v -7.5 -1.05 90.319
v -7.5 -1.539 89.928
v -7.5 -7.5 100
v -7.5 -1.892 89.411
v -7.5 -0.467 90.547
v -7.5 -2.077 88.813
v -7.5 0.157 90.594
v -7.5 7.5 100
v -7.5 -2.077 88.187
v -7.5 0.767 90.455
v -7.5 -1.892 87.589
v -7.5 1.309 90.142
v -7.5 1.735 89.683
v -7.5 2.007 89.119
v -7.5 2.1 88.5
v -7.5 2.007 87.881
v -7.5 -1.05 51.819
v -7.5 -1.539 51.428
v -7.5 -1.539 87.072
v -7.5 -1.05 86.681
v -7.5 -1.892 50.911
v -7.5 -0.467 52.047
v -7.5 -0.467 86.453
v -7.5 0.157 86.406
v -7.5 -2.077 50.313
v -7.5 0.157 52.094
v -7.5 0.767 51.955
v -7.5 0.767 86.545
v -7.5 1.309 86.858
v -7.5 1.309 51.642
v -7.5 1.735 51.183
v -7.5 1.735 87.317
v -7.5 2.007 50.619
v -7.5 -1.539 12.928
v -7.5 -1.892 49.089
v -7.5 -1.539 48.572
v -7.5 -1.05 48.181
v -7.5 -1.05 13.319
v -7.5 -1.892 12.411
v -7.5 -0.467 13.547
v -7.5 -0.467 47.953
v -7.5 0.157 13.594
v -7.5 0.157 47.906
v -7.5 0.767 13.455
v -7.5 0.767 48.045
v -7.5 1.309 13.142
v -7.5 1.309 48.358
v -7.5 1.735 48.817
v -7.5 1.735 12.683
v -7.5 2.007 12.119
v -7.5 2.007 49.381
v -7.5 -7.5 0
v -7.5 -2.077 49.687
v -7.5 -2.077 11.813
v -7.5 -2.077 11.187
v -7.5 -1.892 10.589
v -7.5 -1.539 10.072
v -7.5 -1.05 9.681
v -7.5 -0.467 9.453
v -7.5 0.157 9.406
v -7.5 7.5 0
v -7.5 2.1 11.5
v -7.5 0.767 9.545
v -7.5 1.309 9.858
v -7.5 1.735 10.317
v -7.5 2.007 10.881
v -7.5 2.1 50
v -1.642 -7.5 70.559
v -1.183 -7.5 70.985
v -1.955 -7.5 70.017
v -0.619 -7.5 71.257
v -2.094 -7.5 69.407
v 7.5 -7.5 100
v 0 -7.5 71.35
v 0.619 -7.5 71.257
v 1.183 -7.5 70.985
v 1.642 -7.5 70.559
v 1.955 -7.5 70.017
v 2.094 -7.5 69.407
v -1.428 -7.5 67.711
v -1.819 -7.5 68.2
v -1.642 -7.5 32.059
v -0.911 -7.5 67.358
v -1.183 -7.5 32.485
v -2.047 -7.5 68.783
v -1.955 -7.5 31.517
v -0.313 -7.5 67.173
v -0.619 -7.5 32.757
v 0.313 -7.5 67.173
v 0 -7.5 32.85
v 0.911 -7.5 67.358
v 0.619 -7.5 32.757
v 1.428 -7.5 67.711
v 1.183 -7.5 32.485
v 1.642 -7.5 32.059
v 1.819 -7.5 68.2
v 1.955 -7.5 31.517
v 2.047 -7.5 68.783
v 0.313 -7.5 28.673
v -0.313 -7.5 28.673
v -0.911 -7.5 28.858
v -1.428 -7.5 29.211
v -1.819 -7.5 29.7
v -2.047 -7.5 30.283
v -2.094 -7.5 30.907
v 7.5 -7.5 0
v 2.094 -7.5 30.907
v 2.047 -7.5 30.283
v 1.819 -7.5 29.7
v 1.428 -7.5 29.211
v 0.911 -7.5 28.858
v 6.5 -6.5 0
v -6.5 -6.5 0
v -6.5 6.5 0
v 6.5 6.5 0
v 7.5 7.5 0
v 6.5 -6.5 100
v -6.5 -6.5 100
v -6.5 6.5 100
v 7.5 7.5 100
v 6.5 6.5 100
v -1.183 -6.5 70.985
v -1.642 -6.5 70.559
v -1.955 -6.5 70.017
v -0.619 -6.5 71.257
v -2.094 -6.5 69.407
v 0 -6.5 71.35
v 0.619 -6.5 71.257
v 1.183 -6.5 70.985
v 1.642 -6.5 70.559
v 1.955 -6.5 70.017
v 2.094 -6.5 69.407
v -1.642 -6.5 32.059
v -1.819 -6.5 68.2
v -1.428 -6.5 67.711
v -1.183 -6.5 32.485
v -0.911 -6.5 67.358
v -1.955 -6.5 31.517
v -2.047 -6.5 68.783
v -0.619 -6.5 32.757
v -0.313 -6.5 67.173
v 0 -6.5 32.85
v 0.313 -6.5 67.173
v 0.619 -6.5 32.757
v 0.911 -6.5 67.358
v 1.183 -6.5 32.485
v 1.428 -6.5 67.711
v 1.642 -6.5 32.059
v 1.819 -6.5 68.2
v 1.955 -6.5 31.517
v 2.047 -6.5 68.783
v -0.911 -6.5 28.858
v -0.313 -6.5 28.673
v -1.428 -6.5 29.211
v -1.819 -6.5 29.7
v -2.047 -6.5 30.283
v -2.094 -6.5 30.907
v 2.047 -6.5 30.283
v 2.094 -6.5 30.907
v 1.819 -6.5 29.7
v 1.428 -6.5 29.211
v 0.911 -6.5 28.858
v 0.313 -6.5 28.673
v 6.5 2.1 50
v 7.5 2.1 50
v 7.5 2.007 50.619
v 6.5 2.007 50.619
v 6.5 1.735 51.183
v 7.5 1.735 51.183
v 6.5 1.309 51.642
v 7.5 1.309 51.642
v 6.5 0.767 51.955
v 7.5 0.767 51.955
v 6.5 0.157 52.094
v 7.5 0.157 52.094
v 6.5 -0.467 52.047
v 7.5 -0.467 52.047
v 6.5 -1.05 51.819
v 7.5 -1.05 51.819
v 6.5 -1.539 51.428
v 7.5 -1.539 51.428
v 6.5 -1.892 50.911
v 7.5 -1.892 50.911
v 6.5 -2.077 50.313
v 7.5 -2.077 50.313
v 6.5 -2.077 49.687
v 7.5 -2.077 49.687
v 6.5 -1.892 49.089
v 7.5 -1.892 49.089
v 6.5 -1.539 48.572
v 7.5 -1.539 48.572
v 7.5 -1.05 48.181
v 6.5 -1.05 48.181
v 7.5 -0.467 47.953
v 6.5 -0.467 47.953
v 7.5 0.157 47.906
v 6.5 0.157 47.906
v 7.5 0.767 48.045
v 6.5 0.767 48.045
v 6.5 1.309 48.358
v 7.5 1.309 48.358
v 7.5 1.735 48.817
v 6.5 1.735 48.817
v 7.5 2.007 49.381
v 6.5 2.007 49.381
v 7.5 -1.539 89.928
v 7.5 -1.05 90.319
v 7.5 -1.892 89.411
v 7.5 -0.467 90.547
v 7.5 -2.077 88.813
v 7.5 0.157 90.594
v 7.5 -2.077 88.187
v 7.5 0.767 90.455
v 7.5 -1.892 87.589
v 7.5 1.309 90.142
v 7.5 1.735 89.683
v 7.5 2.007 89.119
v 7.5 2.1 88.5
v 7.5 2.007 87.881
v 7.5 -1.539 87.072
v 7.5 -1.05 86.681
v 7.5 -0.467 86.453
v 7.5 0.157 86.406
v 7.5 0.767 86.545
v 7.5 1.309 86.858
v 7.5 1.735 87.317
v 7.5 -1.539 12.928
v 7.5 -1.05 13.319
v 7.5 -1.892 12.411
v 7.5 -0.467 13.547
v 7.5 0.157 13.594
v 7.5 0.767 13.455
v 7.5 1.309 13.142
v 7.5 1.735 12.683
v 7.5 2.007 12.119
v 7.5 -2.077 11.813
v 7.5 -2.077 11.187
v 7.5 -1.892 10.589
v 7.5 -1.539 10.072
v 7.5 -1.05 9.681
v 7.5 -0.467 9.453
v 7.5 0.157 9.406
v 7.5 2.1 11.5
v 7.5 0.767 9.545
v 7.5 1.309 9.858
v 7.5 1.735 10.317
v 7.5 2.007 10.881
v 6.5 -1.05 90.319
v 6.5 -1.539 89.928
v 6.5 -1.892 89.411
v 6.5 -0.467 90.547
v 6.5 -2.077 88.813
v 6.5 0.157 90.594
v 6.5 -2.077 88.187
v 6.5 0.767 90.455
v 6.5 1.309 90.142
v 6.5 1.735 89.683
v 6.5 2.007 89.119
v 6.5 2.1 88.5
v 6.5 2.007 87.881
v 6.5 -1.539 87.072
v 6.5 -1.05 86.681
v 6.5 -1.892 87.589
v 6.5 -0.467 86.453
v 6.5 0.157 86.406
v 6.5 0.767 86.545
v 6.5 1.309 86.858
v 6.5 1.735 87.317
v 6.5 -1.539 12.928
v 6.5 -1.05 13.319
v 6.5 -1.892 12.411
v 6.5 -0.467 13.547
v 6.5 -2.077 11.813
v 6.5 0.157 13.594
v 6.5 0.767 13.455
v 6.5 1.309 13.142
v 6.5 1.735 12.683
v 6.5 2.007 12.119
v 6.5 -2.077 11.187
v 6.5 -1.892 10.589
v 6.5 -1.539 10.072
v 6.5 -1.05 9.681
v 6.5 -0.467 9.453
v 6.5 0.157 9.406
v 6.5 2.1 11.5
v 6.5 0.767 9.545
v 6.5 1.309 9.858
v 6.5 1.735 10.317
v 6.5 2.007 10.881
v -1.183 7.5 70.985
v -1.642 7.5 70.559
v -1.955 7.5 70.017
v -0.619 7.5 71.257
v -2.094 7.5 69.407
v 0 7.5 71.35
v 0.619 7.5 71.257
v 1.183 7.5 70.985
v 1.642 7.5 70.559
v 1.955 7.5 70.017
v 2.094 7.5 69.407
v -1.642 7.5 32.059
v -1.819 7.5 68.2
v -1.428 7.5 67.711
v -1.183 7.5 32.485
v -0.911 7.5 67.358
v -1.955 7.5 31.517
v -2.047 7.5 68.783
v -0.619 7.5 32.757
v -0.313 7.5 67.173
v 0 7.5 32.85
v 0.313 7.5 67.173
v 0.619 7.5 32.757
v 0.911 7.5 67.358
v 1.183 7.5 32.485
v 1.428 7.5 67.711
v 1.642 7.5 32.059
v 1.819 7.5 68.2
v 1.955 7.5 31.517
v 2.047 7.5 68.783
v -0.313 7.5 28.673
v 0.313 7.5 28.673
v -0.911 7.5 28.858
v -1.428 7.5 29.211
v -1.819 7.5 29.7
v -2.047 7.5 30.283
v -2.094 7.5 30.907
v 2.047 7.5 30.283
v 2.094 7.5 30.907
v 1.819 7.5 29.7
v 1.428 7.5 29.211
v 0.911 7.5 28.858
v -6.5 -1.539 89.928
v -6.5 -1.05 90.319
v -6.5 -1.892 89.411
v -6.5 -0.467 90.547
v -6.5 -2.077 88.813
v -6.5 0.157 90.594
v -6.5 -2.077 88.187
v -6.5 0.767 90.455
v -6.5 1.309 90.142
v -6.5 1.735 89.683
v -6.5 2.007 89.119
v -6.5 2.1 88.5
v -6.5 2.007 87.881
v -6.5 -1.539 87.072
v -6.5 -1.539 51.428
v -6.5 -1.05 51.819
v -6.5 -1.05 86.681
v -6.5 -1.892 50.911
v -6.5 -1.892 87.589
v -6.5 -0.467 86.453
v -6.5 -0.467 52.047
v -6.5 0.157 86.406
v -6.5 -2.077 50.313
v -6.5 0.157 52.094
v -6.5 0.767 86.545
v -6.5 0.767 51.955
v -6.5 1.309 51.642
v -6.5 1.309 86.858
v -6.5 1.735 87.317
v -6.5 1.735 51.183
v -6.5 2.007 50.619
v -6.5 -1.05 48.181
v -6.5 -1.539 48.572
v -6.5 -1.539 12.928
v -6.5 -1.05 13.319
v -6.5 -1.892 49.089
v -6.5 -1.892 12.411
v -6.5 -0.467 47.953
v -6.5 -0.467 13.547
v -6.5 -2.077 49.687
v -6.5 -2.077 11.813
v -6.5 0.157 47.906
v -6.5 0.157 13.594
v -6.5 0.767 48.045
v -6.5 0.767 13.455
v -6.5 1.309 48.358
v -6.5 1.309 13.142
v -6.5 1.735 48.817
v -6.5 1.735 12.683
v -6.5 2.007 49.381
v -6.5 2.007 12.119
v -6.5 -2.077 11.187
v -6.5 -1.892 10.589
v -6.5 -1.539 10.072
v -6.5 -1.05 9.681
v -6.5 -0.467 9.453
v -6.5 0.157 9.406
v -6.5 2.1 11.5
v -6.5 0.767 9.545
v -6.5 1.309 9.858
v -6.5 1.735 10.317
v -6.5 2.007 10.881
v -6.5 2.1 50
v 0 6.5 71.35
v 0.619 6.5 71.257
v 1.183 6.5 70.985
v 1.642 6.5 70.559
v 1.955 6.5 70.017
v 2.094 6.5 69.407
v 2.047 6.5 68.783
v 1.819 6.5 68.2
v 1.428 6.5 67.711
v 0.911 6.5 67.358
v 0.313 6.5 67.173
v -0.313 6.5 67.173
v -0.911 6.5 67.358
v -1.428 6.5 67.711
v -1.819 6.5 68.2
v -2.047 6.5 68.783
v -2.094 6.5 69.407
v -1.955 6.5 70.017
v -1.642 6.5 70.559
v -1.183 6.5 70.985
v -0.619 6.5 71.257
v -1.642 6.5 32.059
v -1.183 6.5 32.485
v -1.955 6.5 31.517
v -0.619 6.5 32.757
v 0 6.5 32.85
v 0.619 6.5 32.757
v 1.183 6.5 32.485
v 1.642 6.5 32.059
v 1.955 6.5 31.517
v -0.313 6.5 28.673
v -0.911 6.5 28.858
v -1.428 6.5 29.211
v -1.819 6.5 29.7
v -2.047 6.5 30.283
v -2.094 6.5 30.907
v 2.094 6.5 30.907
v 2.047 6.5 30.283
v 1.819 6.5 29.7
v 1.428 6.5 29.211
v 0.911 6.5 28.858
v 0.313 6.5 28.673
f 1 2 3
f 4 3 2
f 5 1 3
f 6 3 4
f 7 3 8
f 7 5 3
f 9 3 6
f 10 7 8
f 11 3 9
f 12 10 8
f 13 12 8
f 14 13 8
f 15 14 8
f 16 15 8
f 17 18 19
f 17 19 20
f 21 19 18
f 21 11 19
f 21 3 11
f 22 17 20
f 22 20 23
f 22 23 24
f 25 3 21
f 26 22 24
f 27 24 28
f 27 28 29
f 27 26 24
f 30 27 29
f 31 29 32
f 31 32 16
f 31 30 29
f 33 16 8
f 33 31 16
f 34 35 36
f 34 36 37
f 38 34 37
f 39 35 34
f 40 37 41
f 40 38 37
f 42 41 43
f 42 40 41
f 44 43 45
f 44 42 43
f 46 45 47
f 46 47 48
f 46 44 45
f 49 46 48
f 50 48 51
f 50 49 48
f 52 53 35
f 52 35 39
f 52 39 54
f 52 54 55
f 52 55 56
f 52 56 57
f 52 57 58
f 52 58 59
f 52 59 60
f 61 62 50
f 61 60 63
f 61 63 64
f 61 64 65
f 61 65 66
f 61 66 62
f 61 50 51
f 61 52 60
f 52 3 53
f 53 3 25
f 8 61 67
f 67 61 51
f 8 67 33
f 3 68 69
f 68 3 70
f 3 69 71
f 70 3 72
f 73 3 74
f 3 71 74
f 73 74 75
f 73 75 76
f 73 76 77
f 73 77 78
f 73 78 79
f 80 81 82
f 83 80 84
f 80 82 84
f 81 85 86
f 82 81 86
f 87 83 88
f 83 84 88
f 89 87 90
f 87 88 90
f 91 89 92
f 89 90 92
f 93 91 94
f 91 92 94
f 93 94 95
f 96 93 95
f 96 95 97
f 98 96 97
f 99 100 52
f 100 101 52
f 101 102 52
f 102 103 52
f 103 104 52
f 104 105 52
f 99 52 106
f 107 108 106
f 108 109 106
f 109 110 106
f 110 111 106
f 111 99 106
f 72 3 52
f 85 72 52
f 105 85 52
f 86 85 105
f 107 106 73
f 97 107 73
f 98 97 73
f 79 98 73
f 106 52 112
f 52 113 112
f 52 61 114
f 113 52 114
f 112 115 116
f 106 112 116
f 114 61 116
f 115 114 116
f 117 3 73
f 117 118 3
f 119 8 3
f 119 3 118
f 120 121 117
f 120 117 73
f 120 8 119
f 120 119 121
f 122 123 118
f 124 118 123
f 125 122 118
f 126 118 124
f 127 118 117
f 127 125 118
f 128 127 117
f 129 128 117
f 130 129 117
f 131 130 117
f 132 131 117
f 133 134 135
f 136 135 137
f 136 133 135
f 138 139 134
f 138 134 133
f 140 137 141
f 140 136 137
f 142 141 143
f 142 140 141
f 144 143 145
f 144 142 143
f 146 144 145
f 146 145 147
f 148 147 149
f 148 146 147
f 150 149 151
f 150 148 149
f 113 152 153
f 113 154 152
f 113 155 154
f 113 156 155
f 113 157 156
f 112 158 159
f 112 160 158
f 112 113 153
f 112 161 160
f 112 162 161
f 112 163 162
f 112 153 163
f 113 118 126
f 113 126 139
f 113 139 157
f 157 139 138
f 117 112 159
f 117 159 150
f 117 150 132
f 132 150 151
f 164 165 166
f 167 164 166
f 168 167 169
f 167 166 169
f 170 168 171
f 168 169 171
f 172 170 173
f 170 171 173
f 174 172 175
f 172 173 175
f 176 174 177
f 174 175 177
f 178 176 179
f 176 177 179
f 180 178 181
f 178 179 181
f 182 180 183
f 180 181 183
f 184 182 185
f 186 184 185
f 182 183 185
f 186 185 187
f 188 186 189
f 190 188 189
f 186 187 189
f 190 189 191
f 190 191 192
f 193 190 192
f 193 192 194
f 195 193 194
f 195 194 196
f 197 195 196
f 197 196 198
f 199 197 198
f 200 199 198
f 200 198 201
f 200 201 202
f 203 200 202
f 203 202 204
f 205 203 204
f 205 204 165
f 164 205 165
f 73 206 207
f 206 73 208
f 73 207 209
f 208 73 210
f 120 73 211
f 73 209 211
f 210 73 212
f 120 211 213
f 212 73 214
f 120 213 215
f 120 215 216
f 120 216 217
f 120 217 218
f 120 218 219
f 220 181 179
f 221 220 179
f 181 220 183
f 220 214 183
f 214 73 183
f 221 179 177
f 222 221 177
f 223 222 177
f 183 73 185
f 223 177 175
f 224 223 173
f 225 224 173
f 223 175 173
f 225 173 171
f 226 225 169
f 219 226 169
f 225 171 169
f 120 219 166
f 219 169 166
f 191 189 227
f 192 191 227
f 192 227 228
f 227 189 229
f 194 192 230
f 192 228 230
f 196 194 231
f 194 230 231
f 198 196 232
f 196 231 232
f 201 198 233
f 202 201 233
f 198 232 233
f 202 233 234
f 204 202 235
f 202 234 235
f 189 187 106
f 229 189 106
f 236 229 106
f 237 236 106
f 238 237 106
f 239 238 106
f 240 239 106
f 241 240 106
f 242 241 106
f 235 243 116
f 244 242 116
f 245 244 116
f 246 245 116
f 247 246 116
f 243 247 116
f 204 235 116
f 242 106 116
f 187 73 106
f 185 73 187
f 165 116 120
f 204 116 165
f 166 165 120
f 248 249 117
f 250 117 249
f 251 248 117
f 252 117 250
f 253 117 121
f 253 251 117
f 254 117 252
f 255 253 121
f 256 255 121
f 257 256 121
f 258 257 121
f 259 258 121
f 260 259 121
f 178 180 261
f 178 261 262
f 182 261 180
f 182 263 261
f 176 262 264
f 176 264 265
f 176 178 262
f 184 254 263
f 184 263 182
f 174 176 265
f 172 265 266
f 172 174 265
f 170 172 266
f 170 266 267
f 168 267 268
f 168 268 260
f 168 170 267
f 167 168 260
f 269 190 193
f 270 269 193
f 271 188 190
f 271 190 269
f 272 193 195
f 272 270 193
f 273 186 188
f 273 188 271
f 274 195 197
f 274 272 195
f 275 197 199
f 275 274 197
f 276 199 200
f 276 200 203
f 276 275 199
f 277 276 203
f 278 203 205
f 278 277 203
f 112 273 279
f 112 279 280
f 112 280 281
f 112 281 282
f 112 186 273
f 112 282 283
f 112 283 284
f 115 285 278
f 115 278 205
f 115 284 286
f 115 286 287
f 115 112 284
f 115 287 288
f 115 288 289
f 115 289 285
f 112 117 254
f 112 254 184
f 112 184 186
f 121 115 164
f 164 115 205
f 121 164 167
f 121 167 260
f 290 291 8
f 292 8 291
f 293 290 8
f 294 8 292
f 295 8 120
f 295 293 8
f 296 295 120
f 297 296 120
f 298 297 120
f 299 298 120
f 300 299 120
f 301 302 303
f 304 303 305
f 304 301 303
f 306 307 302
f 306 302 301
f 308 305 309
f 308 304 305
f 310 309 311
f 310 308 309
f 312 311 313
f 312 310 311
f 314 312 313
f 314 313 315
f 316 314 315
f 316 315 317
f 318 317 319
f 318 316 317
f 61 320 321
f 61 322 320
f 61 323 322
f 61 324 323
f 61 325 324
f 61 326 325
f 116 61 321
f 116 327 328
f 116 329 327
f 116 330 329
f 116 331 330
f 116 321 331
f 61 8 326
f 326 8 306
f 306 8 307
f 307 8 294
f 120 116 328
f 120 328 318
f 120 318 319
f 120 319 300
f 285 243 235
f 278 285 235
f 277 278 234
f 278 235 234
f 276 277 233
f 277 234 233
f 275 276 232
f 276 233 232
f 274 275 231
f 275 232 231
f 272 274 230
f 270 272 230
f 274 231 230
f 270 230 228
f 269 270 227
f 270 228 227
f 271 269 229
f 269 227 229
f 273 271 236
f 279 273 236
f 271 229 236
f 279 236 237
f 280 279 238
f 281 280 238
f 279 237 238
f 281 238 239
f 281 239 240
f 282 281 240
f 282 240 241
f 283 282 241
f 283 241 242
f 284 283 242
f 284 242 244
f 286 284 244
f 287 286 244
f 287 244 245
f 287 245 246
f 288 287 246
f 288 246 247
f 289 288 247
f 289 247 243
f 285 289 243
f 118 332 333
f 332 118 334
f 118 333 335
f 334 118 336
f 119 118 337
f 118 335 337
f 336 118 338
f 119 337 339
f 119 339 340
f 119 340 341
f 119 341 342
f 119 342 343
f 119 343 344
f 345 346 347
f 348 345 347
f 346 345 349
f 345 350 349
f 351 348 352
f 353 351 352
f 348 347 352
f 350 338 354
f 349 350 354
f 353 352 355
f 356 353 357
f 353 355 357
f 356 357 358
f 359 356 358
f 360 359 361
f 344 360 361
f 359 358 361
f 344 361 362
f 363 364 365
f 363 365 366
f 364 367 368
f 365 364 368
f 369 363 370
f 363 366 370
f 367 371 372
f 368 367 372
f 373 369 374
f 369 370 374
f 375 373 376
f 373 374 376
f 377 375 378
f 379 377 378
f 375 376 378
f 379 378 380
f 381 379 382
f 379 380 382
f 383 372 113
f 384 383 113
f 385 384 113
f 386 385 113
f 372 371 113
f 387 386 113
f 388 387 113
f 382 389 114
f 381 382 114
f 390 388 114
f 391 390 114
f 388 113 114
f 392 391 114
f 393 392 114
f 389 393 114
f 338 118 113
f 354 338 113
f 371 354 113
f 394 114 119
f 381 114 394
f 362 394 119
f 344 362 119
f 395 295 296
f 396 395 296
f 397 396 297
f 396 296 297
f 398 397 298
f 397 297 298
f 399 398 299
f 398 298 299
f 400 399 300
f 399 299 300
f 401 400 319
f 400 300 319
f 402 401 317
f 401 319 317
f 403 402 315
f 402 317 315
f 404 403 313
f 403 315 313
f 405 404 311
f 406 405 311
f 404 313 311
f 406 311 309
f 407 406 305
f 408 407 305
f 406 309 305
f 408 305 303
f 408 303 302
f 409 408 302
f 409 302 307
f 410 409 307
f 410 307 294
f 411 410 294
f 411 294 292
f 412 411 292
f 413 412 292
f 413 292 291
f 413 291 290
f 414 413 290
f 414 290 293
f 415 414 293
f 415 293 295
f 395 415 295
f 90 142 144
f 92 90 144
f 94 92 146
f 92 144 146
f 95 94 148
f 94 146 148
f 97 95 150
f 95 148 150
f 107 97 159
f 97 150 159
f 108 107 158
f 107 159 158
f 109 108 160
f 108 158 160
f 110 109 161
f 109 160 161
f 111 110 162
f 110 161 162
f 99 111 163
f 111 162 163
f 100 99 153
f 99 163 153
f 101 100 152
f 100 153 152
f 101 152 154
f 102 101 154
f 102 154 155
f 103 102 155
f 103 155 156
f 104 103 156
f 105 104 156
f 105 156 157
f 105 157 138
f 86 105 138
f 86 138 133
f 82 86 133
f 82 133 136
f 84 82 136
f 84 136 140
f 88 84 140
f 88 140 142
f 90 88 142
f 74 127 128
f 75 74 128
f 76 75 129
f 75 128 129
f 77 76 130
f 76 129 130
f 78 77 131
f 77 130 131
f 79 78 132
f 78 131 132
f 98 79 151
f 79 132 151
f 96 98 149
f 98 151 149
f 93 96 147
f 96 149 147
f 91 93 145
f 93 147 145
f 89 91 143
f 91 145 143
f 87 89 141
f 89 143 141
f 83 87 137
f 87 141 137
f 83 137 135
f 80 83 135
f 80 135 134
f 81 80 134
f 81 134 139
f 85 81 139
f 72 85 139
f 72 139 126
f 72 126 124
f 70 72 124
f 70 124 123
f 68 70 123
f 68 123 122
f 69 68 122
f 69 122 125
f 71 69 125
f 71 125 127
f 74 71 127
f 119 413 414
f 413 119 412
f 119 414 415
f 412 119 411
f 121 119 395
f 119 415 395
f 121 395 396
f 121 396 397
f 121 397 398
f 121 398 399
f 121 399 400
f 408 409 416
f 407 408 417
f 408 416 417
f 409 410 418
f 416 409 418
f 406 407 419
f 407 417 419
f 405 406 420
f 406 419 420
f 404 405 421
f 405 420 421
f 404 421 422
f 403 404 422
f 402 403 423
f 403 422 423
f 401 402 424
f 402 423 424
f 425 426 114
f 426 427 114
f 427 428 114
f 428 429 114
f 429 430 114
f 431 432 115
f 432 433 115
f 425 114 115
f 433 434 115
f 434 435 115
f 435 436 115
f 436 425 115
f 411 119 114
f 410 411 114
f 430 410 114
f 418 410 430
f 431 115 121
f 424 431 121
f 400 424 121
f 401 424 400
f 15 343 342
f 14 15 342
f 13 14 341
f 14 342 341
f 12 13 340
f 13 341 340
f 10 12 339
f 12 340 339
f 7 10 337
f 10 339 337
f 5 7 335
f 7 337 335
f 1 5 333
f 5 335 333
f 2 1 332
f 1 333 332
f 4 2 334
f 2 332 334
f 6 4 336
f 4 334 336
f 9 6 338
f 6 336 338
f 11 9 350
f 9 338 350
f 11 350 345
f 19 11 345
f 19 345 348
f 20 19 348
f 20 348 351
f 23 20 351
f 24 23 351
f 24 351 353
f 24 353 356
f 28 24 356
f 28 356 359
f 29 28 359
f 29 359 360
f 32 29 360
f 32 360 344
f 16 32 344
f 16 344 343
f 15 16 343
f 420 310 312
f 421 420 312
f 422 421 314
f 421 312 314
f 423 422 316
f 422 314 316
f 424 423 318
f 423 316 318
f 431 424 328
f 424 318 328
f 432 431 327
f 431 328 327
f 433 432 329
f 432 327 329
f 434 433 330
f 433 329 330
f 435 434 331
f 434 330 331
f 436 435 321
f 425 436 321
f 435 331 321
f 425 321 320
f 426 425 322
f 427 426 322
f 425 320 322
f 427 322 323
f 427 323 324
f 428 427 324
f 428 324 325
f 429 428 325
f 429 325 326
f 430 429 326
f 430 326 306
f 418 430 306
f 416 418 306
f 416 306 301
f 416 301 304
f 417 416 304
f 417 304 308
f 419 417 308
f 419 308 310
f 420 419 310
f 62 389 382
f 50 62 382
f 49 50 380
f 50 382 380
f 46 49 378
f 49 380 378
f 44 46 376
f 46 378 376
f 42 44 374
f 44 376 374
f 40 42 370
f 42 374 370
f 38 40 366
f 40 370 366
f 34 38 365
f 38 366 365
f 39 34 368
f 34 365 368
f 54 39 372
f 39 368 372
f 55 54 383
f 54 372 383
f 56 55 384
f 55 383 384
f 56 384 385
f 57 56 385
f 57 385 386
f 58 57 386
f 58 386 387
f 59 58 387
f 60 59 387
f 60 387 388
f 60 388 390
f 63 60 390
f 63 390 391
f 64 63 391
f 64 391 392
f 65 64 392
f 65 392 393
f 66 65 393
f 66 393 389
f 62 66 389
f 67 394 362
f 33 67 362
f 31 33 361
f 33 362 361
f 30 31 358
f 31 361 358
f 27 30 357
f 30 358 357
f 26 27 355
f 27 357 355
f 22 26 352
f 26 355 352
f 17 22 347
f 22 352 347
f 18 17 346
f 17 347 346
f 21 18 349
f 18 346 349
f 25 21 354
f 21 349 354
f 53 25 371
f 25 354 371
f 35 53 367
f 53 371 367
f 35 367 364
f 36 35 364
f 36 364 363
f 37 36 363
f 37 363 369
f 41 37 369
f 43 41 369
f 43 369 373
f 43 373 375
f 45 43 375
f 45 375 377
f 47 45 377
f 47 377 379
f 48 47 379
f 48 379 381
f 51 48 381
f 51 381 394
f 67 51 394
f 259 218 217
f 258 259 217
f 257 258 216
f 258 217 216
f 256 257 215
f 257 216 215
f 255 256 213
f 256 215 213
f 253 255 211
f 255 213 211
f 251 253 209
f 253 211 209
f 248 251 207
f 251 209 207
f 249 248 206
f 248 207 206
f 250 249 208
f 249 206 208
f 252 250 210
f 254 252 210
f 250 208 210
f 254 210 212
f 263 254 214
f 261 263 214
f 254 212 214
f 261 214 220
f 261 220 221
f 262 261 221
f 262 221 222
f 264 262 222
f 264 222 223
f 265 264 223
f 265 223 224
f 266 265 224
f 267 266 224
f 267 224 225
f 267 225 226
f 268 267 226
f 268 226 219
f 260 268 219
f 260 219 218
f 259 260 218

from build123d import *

# Parameters (mm, degrees)
SKETCH_1_W          = 15
SKETCH_1_H          = 15
SKETCH_1_W_2        = 13
SKETCH_1_H_2        = 13
EXTRUDE_1_DEPTH     = 100
SKETCH_2_R          = 2.1
CUT_EXTRUDE_1_DEPTH = 366
SKETCH_3_R          = 2.1
CUT_EXTRUDE_2_DEPTH = 55


with BuildPart() as part:
    # 草图1 → 凸台-拉伸1 (new body)
    with BuildSketch(Plane.XY):
        Rectangle(SKETCH_1_W, SKETCH_1_H)
        Rectangle(SKETCH_1_W_2, SKETCH_1_H_2, mode=Mode.SUBTRACT)
    extrude(amount=EXTRUDE_1_DEPTH)

    # 草图2 → 切除-拉伸1 (cut)
    with BuildSketch(Plane(origin=(7.5, 0, 0), x_dir=(0, 0, -1), z_dir=(1, 0, 0))):
        with Locations(Location((-50, 0, 0), (0, 0, 90))):
            Circle(SKETCH_2_R)
        with Locations(Location((-88.5, 0, 0), (0, 0, 90))):
            Circle(SKETCH_2_R)
        with Locations(Location((-11.5, 0, 0), (0, 0, 90))):
            Circle(SKETCH_2_R)
    extrude(amount=-CUT_EXTRUDE_1_DEPTH, mode=Mode.SUBTRACT)

    # 草图3 → 切除-拉伸2 (cut)
    with BuildSketch(Plane(origin=(0, 7.5, 0), x_dir=(1, 0, 0), z_dir=(0, 1, 0))):
        with Locations(Location((0, -30.75, 0), (0, 0, 270))):
            Circle(SKETCH_3_R)
        with Locations(Location((0, -69.25, 0), (0, 0, 270))):
            Circle(SKETCH_3_R)
    extrude(amount=-CUT_EXTRUDE_2_DEPTH, mode=Mode.SUBTRACT)


solid = part.part
